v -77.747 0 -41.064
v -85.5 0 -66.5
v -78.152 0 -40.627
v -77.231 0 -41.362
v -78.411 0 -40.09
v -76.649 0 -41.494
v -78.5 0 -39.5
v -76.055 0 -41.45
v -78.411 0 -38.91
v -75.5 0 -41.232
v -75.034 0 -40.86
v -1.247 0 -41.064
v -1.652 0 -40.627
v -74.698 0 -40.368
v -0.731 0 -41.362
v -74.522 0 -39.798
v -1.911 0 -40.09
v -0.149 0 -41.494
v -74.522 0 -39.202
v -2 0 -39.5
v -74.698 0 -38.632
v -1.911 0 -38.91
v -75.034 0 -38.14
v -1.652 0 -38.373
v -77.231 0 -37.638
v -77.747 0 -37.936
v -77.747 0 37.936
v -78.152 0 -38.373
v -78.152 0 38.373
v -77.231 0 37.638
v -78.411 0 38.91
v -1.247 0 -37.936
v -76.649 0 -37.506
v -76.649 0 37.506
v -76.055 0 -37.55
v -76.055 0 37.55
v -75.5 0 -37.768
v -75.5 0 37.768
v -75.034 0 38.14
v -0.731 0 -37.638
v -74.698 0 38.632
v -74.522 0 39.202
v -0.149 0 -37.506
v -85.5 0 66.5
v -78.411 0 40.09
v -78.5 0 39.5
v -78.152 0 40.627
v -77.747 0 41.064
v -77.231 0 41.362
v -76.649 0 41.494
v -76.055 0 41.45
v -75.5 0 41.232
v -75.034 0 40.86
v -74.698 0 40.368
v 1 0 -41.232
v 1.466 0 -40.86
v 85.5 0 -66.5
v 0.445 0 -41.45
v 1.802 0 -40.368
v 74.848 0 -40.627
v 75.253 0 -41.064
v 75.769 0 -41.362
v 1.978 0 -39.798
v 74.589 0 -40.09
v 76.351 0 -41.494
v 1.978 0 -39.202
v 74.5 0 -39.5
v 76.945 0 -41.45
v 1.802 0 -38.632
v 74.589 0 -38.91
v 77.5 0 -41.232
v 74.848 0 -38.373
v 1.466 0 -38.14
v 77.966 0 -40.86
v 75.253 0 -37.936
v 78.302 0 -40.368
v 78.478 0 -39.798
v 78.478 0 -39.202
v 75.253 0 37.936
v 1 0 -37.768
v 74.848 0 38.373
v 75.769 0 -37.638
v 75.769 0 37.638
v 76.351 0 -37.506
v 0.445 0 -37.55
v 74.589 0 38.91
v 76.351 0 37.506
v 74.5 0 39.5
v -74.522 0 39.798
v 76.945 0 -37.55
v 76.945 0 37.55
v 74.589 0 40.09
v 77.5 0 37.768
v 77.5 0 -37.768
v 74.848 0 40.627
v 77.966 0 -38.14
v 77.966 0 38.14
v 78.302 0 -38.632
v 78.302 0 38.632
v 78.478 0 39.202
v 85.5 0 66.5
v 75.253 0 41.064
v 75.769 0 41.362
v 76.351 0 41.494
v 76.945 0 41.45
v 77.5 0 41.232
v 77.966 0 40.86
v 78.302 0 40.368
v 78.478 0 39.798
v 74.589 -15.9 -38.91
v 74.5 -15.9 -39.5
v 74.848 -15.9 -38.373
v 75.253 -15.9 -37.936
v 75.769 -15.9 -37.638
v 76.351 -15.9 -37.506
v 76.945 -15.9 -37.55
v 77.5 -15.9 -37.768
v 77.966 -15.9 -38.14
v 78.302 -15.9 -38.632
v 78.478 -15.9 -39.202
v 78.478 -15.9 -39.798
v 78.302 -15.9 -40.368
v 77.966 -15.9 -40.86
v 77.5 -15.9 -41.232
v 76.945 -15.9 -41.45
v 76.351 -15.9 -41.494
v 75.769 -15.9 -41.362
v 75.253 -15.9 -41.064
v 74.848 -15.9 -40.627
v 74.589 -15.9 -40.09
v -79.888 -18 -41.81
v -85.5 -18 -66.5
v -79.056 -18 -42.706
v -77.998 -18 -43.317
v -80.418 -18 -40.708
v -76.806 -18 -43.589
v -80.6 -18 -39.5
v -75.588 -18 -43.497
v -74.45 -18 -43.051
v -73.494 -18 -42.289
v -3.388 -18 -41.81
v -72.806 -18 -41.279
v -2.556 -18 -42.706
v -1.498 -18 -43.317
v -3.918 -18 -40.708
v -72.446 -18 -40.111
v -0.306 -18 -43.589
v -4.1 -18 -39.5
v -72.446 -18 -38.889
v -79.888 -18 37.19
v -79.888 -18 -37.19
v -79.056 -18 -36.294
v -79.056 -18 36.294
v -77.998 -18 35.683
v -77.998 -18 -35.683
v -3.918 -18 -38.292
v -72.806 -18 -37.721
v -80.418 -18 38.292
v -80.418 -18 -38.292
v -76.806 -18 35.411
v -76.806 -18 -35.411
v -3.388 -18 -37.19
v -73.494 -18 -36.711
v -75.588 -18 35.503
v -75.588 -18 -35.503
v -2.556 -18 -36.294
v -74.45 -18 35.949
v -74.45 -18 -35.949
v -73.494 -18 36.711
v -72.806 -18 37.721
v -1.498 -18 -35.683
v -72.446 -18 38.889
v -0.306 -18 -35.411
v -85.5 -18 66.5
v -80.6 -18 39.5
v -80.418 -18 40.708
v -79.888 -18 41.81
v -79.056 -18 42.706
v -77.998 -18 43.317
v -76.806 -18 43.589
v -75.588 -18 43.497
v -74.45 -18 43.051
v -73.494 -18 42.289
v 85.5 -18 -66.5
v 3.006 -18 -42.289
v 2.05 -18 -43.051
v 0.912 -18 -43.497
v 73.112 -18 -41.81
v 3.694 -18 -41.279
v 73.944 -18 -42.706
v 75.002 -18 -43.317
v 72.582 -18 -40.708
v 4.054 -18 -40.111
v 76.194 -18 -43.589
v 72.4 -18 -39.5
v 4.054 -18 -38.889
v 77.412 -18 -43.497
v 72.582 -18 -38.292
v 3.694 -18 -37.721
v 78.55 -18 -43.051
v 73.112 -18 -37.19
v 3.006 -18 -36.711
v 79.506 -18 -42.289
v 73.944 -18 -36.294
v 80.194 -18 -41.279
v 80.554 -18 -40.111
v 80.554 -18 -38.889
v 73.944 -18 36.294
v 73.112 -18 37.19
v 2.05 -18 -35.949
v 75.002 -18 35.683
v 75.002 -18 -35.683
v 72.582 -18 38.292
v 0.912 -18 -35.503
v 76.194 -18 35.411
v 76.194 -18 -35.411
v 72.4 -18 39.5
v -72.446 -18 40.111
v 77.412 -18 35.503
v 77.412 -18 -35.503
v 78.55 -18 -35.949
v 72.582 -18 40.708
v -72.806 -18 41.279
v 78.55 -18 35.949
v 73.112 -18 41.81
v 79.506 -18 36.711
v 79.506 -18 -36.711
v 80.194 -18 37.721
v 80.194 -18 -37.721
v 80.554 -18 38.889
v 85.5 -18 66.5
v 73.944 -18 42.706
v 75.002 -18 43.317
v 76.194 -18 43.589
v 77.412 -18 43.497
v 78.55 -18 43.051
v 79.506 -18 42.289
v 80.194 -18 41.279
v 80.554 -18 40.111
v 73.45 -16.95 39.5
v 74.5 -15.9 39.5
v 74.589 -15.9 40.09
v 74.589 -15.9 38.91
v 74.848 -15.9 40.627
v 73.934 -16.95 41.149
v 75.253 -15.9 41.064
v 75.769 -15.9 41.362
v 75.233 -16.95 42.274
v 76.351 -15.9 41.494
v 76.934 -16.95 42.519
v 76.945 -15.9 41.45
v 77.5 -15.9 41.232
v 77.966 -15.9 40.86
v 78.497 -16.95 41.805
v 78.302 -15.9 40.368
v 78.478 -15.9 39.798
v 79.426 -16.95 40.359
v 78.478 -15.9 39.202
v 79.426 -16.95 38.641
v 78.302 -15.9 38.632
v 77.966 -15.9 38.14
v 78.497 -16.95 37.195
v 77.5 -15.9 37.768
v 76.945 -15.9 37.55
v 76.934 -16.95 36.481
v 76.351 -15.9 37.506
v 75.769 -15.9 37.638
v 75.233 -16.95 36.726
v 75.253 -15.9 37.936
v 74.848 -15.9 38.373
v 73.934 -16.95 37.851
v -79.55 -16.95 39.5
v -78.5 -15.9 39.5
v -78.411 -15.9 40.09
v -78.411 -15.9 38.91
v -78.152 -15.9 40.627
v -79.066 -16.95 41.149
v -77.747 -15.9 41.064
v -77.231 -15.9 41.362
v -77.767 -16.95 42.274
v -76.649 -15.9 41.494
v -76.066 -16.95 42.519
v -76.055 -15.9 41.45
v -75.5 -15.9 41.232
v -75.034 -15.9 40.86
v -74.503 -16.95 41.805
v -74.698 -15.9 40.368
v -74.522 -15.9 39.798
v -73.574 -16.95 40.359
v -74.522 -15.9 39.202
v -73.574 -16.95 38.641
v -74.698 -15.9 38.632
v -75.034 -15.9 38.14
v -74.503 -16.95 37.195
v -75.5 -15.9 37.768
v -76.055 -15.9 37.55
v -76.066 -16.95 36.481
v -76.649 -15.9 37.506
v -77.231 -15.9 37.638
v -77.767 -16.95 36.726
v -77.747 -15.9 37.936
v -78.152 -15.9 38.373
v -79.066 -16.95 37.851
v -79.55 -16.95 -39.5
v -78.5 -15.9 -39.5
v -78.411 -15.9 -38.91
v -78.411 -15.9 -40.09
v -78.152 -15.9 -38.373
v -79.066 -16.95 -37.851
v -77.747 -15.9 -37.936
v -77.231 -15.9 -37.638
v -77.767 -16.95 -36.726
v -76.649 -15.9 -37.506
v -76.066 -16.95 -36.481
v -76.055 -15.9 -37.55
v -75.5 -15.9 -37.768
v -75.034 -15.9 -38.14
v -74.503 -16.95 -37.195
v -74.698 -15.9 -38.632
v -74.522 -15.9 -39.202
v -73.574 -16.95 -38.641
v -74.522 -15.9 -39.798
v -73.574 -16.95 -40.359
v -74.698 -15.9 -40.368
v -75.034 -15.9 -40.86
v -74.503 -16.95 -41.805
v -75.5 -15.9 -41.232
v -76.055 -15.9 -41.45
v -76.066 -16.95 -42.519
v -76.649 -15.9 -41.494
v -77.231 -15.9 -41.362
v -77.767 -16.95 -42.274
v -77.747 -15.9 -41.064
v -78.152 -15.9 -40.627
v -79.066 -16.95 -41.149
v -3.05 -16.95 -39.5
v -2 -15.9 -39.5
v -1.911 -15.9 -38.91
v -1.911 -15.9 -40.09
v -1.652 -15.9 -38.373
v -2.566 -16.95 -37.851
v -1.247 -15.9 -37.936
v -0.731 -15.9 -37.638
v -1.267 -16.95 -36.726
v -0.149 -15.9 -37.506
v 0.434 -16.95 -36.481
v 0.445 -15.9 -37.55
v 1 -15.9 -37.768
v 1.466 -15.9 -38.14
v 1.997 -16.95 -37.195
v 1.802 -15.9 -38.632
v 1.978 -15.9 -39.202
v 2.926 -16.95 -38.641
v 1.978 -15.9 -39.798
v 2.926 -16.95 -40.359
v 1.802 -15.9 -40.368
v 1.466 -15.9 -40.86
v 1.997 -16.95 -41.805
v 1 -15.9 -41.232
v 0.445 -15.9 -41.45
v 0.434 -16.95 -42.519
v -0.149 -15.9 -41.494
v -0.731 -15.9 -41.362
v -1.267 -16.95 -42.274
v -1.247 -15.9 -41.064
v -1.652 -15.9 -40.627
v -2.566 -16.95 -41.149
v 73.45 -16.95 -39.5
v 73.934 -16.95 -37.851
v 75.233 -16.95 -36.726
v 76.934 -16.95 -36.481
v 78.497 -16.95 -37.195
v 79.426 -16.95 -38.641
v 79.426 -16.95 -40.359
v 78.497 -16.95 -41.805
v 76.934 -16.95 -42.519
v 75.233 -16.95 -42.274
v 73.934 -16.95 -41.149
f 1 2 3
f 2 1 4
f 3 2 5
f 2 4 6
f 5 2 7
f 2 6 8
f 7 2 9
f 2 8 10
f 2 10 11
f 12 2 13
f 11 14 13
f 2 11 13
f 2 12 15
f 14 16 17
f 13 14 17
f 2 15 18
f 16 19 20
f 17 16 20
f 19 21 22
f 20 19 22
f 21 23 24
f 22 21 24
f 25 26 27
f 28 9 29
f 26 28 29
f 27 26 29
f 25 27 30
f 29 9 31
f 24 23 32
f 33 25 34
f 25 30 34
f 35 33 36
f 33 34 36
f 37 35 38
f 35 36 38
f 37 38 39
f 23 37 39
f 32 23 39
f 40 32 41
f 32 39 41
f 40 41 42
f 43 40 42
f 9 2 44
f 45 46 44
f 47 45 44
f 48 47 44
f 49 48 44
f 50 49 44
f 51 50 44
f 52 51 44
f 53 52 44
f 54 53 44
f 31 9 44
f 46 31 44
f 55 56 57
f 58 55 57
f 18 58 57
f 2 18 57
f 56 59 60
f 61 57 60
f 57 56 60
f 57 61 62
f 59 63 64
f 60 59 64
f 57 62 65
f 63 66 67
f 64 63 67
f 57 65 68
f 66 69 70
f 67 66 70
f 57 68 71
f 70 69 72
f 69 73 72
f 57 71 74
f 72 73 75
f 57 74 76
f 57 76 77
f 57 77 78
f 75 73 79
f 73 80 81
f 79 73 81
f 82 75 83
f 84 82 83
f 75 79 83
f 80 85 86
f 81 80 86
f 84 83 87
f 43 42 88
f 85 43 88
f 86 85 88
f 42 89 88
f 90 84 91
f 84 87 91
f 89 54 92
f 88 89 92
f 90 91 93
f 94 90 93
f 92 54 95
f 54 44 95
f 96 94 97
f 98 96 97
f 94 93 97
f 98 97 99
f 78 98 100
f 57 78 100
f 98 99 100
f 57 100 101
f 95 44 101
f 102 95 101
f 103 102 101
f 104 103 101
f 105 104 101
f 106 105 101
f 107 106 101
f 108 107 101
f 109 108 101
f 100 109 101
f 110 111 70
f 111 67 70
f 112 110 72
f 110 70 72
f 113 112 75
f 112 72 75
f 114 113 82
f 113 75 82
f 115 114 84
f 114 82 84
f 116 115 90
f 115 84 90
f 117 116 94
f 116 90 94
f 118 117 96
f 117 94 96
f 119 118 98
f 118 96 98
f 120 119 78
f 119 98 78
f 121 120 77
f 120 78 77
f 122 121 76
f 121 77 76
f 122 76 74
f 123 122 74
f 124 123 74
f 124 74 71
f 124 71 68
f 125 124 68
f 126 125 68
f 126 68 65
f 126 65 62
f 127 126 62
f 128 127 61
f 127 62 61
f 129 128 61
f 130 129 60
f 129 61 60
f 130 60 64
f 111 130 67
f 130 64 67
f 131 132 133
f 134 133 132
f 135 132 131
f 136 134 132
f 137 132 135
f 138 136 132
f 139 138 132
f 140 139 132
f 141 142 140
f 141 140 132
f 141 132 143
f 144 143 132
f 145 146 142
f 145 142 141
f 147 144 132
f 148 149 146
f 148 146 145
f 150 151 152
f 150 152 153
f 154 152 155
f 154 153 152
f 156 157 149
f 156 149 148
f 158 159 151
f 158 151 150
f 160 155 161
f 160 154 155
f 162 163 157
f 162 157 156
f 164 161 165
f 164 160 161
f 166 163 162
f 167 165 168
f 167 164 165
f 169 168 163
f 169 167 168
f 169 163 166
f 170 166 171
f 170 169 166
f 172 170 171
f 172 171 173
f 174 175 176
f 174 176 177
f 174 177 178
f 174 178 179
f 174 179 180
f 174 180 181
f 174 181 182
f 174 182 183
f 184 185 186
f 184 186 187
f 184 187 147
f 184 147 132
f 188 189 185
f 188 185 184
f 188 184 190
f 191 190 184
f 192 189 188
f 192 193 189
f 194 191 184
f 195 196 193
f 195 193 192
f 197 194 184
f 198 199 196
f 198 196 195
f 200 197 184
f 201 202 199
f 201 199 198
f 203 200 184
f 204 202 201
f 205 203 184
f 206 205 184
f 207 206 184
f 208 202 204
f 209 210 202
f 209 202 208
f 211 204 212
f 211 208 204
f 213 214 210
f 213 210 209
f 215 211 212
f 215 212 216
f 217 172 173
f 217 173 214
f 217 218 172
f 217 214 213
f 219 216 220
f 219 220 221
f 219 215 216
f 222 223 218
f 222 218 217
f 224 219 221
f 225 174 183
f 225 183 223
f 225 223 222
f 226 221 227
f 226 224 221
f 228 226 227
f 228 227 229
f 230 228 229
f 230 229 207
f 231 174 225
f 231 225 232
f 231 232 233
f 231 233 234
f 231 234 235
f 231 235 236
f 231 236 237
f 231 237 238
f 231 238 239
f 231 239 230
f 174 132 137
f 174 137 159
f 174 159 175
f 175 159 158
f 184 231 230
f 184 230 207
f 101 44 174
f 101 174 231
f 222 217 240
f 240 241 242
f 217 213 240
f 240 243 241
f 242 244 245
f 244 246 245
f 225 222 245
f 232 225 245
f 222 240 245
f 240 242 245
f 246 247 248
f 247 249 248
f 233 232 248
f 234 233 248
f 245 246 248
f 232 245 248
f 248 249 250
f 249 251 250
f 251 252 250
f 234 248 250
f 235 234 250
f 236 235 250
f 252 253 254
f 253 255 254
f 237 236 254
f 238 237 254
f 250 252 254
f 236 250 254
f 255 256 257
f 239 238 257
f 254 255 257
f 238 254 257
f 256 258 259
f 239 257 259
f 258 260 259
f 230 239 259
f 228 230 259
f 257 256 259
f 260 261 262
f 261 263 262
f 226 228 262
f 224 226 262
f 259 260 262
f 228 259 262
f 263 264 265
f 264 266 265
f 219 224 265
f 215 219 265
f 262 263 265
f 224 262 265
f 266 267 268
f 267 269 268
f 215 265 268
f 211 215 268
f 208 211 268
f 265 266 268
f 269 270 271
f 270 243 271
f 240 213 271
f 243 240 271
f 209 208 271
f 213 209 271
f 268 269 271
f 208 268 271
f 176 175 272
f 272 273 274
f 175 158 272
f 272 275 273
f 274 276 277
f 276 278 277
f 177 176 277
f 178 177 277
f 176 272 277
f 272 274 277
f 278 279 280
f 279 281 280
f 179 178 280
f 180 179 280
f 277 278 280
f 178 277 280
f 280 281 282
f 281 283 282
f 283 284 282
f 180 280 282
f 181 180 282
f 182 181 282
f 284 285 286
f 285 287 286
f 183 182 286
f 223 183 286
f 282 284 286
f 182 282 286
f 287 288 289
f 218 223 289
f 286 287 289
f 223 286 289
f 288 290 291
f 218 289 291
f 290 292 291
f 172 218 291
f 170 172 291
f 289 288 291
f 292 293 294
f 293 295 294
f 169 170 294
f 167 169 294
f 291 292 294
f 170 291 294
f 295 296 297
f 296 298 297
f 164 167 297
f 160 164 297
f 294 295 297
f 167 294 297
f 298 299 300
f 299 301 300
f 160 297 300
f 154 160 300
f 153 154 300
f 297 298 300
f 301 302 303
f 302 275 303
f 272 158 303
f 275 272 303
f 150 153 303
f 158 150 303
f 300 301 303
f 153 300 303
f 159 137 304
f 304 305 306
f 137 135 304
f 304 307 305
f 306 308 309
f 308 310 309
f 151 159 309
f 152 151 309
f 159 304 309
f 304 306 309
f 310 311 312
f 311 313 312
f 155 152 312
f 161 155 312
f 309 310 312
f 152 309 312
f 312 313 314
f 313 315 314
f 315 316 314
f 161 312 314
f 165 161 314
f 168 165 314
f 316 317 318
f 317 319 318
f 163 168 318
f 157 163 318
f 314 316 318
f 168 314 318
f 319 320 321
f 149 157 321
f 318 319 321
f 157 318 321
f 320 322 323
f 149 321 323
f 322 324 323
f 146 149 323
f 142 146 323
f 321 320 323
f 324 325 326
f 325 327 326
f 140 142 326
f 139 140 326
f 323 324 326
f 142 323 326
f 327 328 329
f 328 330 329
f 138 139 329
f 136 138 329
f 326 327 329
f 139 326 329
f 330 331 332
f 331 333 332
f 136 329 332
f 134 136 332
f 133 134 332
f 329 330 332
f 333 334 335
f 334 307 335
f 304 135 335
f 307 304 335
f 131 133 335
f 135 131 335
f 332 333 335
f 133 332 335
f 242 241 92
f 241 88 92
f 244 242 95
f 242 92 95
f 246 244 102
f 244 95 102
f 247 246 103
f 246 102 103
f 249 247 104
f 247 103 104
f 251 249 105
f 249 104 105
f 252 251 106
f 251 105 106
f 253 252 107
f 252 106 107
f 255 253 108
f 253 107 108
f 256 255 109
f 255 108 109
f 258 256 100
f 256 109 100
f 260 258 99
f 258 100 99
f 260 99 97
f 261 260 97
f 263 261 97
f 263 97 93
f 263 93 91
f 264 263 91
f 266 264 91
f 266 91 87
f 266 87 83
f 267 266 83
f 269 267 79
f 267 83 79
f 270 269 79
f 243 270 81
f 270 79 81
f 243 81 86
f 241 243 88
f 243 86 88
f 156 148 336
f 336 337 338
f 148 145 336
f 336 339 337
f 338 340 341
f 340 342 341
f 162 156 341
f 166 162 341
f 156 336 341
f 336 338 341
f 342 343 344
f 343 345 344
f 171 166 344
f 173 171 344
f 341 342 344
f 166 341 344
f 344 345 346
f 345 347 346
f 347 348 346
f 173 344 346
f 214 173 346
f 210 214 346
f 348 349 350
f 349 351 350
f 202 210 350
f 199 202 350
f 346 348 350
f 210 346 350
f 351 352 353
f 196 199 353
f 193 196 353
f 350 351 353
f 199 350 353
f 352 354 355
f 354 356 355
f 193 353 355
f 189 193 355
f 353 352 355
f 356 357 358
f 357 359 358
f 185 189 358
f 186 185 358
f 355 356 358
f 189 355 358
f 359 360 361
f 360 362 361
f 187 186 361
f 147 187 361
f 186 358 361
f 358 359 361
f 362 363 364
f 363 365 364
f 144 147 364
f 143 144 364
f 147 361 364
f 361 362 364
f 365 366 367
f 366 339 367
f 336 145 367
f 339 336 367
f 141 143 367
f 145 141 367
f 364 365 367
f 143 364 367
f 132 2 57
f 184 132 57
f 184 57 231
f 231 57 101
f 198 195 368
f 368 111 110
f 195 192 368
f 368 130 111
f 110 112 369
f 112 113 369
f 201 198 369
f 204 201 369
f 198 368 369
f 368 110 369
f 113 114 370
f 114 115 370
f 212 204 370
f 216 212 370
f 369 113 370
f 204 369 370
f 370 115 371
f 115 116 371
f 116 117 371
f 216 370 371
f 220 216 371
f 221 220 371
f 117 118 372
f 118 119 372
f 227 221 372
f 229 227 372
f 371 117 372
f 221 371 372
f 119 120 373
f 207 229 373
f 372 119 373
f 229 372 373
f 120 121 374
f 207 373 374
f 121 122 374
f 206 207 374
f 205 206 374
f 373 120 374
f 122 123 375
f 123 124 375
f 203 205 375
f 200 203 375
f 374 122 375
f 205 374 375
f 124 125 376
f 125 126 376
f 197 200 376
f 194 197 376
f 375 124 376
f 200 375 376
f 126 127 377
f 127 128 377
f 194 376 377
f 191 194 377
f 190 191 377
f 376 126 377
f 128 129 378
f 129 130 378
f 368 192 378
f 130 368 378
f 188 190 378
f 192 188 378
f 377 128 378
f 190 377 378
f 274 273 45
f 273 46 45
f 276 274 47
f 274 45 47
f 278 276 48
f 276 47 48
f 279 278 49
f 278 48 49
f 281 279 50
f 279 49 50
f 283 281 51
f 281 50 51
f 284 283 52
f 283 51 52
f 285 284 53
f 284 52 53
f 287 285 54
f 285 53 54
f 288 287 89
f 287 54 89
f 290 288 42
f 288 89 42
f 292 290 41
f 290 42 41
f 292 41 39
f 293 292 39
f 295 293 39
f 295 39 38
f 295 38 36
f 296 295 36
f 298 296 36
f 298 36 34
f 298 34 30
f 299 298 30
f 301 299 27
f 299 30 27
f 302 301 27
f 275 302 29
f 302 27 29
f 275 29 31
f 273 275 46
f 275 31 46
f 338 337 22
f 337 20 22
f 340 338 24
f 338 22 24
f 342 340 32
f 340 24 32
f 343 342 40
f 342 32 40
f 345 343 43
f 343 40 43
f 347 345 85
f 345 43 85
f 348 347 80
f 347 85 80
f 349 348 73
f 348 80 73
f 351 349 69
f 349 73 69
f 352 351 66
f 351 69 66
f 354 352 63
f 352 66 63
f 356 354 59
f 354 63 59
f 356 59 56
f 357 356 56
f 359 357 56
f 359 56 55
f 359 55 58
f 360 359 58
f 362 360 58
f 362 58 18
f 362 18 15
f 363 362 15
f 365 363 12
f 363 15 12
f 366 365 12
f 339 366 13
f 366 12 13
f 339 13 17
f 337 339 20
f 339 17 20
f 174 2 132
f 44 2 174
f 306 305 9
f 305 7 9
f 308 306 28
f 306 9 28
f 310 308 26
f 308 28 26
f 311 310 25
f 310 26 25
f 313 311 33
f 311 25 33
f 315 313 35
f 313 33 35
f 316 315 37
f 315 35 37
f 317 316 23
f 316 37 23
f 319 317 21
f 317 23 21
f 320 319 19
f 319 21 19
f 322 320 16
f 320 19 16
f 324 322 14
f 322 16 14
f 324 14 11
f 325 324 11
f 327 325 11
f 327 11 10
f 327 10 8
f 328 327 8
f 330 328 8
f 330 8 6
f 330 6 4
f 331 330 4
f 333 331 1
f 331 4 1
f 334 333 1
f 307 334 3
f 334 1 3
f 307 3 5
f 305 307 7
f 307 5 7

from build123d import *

# Parameters (mm, degrees)
F0_W           = 171
F0_H           = 133
F1_DEPTH       = 18
F4_D           = 4
F4_CSINK_D     = 8.2
F4_CSINK_ANGLE = 90
F5_D           = 4
F5_CSINK_D     = 8.2
F5_CSINK_ANGLE = 90
F7_D           = 4
F7_CSINK_D     = 8.2
F7_CSINK_ANGLE = 90


# Not quite as in the source:
# - a feature of the source that left no trace in its solid (it failed there, or was rolled back) is left out


with BuildPart() as f1:
    # F0 (on Front) → F1 (new body)
    with BuildSketch(Plane.XZ):
        Rectangle(F0_W, F0_H)
    extrude(amount=F1_DEPTH)

    # F4 (through all)
    with Locations(Plane.XZ.offset(18)):
        with Locations((0, -39.5)):
            CounterSinkHole(F4_D / 2, F4_CSINK_D / 2, counter_sink_angle=F4_CSINK_ANGLE)

    # F5 (through all)
    with Locations(Plane.XZ.offset(18)):
        with Locations((-76.5, -39.5), (76.5, -39.5)):
            CounterSinkHole(F5_D / 2, F5_CSINK_D / 2, counter_sink_angle=F5_CSINK_ANGLE)

    # F7 (through all)
    with Locations(Plane.XZ.offset(18)):
        with Locations((-76.5, 39.5), (76.5, 39.5)):
            CounterSinkHole(F7_D / 2, F7_CSINK_D / 2, counter_sink_angle=F7_CSINK_ANGLE)


solid = f1.part
